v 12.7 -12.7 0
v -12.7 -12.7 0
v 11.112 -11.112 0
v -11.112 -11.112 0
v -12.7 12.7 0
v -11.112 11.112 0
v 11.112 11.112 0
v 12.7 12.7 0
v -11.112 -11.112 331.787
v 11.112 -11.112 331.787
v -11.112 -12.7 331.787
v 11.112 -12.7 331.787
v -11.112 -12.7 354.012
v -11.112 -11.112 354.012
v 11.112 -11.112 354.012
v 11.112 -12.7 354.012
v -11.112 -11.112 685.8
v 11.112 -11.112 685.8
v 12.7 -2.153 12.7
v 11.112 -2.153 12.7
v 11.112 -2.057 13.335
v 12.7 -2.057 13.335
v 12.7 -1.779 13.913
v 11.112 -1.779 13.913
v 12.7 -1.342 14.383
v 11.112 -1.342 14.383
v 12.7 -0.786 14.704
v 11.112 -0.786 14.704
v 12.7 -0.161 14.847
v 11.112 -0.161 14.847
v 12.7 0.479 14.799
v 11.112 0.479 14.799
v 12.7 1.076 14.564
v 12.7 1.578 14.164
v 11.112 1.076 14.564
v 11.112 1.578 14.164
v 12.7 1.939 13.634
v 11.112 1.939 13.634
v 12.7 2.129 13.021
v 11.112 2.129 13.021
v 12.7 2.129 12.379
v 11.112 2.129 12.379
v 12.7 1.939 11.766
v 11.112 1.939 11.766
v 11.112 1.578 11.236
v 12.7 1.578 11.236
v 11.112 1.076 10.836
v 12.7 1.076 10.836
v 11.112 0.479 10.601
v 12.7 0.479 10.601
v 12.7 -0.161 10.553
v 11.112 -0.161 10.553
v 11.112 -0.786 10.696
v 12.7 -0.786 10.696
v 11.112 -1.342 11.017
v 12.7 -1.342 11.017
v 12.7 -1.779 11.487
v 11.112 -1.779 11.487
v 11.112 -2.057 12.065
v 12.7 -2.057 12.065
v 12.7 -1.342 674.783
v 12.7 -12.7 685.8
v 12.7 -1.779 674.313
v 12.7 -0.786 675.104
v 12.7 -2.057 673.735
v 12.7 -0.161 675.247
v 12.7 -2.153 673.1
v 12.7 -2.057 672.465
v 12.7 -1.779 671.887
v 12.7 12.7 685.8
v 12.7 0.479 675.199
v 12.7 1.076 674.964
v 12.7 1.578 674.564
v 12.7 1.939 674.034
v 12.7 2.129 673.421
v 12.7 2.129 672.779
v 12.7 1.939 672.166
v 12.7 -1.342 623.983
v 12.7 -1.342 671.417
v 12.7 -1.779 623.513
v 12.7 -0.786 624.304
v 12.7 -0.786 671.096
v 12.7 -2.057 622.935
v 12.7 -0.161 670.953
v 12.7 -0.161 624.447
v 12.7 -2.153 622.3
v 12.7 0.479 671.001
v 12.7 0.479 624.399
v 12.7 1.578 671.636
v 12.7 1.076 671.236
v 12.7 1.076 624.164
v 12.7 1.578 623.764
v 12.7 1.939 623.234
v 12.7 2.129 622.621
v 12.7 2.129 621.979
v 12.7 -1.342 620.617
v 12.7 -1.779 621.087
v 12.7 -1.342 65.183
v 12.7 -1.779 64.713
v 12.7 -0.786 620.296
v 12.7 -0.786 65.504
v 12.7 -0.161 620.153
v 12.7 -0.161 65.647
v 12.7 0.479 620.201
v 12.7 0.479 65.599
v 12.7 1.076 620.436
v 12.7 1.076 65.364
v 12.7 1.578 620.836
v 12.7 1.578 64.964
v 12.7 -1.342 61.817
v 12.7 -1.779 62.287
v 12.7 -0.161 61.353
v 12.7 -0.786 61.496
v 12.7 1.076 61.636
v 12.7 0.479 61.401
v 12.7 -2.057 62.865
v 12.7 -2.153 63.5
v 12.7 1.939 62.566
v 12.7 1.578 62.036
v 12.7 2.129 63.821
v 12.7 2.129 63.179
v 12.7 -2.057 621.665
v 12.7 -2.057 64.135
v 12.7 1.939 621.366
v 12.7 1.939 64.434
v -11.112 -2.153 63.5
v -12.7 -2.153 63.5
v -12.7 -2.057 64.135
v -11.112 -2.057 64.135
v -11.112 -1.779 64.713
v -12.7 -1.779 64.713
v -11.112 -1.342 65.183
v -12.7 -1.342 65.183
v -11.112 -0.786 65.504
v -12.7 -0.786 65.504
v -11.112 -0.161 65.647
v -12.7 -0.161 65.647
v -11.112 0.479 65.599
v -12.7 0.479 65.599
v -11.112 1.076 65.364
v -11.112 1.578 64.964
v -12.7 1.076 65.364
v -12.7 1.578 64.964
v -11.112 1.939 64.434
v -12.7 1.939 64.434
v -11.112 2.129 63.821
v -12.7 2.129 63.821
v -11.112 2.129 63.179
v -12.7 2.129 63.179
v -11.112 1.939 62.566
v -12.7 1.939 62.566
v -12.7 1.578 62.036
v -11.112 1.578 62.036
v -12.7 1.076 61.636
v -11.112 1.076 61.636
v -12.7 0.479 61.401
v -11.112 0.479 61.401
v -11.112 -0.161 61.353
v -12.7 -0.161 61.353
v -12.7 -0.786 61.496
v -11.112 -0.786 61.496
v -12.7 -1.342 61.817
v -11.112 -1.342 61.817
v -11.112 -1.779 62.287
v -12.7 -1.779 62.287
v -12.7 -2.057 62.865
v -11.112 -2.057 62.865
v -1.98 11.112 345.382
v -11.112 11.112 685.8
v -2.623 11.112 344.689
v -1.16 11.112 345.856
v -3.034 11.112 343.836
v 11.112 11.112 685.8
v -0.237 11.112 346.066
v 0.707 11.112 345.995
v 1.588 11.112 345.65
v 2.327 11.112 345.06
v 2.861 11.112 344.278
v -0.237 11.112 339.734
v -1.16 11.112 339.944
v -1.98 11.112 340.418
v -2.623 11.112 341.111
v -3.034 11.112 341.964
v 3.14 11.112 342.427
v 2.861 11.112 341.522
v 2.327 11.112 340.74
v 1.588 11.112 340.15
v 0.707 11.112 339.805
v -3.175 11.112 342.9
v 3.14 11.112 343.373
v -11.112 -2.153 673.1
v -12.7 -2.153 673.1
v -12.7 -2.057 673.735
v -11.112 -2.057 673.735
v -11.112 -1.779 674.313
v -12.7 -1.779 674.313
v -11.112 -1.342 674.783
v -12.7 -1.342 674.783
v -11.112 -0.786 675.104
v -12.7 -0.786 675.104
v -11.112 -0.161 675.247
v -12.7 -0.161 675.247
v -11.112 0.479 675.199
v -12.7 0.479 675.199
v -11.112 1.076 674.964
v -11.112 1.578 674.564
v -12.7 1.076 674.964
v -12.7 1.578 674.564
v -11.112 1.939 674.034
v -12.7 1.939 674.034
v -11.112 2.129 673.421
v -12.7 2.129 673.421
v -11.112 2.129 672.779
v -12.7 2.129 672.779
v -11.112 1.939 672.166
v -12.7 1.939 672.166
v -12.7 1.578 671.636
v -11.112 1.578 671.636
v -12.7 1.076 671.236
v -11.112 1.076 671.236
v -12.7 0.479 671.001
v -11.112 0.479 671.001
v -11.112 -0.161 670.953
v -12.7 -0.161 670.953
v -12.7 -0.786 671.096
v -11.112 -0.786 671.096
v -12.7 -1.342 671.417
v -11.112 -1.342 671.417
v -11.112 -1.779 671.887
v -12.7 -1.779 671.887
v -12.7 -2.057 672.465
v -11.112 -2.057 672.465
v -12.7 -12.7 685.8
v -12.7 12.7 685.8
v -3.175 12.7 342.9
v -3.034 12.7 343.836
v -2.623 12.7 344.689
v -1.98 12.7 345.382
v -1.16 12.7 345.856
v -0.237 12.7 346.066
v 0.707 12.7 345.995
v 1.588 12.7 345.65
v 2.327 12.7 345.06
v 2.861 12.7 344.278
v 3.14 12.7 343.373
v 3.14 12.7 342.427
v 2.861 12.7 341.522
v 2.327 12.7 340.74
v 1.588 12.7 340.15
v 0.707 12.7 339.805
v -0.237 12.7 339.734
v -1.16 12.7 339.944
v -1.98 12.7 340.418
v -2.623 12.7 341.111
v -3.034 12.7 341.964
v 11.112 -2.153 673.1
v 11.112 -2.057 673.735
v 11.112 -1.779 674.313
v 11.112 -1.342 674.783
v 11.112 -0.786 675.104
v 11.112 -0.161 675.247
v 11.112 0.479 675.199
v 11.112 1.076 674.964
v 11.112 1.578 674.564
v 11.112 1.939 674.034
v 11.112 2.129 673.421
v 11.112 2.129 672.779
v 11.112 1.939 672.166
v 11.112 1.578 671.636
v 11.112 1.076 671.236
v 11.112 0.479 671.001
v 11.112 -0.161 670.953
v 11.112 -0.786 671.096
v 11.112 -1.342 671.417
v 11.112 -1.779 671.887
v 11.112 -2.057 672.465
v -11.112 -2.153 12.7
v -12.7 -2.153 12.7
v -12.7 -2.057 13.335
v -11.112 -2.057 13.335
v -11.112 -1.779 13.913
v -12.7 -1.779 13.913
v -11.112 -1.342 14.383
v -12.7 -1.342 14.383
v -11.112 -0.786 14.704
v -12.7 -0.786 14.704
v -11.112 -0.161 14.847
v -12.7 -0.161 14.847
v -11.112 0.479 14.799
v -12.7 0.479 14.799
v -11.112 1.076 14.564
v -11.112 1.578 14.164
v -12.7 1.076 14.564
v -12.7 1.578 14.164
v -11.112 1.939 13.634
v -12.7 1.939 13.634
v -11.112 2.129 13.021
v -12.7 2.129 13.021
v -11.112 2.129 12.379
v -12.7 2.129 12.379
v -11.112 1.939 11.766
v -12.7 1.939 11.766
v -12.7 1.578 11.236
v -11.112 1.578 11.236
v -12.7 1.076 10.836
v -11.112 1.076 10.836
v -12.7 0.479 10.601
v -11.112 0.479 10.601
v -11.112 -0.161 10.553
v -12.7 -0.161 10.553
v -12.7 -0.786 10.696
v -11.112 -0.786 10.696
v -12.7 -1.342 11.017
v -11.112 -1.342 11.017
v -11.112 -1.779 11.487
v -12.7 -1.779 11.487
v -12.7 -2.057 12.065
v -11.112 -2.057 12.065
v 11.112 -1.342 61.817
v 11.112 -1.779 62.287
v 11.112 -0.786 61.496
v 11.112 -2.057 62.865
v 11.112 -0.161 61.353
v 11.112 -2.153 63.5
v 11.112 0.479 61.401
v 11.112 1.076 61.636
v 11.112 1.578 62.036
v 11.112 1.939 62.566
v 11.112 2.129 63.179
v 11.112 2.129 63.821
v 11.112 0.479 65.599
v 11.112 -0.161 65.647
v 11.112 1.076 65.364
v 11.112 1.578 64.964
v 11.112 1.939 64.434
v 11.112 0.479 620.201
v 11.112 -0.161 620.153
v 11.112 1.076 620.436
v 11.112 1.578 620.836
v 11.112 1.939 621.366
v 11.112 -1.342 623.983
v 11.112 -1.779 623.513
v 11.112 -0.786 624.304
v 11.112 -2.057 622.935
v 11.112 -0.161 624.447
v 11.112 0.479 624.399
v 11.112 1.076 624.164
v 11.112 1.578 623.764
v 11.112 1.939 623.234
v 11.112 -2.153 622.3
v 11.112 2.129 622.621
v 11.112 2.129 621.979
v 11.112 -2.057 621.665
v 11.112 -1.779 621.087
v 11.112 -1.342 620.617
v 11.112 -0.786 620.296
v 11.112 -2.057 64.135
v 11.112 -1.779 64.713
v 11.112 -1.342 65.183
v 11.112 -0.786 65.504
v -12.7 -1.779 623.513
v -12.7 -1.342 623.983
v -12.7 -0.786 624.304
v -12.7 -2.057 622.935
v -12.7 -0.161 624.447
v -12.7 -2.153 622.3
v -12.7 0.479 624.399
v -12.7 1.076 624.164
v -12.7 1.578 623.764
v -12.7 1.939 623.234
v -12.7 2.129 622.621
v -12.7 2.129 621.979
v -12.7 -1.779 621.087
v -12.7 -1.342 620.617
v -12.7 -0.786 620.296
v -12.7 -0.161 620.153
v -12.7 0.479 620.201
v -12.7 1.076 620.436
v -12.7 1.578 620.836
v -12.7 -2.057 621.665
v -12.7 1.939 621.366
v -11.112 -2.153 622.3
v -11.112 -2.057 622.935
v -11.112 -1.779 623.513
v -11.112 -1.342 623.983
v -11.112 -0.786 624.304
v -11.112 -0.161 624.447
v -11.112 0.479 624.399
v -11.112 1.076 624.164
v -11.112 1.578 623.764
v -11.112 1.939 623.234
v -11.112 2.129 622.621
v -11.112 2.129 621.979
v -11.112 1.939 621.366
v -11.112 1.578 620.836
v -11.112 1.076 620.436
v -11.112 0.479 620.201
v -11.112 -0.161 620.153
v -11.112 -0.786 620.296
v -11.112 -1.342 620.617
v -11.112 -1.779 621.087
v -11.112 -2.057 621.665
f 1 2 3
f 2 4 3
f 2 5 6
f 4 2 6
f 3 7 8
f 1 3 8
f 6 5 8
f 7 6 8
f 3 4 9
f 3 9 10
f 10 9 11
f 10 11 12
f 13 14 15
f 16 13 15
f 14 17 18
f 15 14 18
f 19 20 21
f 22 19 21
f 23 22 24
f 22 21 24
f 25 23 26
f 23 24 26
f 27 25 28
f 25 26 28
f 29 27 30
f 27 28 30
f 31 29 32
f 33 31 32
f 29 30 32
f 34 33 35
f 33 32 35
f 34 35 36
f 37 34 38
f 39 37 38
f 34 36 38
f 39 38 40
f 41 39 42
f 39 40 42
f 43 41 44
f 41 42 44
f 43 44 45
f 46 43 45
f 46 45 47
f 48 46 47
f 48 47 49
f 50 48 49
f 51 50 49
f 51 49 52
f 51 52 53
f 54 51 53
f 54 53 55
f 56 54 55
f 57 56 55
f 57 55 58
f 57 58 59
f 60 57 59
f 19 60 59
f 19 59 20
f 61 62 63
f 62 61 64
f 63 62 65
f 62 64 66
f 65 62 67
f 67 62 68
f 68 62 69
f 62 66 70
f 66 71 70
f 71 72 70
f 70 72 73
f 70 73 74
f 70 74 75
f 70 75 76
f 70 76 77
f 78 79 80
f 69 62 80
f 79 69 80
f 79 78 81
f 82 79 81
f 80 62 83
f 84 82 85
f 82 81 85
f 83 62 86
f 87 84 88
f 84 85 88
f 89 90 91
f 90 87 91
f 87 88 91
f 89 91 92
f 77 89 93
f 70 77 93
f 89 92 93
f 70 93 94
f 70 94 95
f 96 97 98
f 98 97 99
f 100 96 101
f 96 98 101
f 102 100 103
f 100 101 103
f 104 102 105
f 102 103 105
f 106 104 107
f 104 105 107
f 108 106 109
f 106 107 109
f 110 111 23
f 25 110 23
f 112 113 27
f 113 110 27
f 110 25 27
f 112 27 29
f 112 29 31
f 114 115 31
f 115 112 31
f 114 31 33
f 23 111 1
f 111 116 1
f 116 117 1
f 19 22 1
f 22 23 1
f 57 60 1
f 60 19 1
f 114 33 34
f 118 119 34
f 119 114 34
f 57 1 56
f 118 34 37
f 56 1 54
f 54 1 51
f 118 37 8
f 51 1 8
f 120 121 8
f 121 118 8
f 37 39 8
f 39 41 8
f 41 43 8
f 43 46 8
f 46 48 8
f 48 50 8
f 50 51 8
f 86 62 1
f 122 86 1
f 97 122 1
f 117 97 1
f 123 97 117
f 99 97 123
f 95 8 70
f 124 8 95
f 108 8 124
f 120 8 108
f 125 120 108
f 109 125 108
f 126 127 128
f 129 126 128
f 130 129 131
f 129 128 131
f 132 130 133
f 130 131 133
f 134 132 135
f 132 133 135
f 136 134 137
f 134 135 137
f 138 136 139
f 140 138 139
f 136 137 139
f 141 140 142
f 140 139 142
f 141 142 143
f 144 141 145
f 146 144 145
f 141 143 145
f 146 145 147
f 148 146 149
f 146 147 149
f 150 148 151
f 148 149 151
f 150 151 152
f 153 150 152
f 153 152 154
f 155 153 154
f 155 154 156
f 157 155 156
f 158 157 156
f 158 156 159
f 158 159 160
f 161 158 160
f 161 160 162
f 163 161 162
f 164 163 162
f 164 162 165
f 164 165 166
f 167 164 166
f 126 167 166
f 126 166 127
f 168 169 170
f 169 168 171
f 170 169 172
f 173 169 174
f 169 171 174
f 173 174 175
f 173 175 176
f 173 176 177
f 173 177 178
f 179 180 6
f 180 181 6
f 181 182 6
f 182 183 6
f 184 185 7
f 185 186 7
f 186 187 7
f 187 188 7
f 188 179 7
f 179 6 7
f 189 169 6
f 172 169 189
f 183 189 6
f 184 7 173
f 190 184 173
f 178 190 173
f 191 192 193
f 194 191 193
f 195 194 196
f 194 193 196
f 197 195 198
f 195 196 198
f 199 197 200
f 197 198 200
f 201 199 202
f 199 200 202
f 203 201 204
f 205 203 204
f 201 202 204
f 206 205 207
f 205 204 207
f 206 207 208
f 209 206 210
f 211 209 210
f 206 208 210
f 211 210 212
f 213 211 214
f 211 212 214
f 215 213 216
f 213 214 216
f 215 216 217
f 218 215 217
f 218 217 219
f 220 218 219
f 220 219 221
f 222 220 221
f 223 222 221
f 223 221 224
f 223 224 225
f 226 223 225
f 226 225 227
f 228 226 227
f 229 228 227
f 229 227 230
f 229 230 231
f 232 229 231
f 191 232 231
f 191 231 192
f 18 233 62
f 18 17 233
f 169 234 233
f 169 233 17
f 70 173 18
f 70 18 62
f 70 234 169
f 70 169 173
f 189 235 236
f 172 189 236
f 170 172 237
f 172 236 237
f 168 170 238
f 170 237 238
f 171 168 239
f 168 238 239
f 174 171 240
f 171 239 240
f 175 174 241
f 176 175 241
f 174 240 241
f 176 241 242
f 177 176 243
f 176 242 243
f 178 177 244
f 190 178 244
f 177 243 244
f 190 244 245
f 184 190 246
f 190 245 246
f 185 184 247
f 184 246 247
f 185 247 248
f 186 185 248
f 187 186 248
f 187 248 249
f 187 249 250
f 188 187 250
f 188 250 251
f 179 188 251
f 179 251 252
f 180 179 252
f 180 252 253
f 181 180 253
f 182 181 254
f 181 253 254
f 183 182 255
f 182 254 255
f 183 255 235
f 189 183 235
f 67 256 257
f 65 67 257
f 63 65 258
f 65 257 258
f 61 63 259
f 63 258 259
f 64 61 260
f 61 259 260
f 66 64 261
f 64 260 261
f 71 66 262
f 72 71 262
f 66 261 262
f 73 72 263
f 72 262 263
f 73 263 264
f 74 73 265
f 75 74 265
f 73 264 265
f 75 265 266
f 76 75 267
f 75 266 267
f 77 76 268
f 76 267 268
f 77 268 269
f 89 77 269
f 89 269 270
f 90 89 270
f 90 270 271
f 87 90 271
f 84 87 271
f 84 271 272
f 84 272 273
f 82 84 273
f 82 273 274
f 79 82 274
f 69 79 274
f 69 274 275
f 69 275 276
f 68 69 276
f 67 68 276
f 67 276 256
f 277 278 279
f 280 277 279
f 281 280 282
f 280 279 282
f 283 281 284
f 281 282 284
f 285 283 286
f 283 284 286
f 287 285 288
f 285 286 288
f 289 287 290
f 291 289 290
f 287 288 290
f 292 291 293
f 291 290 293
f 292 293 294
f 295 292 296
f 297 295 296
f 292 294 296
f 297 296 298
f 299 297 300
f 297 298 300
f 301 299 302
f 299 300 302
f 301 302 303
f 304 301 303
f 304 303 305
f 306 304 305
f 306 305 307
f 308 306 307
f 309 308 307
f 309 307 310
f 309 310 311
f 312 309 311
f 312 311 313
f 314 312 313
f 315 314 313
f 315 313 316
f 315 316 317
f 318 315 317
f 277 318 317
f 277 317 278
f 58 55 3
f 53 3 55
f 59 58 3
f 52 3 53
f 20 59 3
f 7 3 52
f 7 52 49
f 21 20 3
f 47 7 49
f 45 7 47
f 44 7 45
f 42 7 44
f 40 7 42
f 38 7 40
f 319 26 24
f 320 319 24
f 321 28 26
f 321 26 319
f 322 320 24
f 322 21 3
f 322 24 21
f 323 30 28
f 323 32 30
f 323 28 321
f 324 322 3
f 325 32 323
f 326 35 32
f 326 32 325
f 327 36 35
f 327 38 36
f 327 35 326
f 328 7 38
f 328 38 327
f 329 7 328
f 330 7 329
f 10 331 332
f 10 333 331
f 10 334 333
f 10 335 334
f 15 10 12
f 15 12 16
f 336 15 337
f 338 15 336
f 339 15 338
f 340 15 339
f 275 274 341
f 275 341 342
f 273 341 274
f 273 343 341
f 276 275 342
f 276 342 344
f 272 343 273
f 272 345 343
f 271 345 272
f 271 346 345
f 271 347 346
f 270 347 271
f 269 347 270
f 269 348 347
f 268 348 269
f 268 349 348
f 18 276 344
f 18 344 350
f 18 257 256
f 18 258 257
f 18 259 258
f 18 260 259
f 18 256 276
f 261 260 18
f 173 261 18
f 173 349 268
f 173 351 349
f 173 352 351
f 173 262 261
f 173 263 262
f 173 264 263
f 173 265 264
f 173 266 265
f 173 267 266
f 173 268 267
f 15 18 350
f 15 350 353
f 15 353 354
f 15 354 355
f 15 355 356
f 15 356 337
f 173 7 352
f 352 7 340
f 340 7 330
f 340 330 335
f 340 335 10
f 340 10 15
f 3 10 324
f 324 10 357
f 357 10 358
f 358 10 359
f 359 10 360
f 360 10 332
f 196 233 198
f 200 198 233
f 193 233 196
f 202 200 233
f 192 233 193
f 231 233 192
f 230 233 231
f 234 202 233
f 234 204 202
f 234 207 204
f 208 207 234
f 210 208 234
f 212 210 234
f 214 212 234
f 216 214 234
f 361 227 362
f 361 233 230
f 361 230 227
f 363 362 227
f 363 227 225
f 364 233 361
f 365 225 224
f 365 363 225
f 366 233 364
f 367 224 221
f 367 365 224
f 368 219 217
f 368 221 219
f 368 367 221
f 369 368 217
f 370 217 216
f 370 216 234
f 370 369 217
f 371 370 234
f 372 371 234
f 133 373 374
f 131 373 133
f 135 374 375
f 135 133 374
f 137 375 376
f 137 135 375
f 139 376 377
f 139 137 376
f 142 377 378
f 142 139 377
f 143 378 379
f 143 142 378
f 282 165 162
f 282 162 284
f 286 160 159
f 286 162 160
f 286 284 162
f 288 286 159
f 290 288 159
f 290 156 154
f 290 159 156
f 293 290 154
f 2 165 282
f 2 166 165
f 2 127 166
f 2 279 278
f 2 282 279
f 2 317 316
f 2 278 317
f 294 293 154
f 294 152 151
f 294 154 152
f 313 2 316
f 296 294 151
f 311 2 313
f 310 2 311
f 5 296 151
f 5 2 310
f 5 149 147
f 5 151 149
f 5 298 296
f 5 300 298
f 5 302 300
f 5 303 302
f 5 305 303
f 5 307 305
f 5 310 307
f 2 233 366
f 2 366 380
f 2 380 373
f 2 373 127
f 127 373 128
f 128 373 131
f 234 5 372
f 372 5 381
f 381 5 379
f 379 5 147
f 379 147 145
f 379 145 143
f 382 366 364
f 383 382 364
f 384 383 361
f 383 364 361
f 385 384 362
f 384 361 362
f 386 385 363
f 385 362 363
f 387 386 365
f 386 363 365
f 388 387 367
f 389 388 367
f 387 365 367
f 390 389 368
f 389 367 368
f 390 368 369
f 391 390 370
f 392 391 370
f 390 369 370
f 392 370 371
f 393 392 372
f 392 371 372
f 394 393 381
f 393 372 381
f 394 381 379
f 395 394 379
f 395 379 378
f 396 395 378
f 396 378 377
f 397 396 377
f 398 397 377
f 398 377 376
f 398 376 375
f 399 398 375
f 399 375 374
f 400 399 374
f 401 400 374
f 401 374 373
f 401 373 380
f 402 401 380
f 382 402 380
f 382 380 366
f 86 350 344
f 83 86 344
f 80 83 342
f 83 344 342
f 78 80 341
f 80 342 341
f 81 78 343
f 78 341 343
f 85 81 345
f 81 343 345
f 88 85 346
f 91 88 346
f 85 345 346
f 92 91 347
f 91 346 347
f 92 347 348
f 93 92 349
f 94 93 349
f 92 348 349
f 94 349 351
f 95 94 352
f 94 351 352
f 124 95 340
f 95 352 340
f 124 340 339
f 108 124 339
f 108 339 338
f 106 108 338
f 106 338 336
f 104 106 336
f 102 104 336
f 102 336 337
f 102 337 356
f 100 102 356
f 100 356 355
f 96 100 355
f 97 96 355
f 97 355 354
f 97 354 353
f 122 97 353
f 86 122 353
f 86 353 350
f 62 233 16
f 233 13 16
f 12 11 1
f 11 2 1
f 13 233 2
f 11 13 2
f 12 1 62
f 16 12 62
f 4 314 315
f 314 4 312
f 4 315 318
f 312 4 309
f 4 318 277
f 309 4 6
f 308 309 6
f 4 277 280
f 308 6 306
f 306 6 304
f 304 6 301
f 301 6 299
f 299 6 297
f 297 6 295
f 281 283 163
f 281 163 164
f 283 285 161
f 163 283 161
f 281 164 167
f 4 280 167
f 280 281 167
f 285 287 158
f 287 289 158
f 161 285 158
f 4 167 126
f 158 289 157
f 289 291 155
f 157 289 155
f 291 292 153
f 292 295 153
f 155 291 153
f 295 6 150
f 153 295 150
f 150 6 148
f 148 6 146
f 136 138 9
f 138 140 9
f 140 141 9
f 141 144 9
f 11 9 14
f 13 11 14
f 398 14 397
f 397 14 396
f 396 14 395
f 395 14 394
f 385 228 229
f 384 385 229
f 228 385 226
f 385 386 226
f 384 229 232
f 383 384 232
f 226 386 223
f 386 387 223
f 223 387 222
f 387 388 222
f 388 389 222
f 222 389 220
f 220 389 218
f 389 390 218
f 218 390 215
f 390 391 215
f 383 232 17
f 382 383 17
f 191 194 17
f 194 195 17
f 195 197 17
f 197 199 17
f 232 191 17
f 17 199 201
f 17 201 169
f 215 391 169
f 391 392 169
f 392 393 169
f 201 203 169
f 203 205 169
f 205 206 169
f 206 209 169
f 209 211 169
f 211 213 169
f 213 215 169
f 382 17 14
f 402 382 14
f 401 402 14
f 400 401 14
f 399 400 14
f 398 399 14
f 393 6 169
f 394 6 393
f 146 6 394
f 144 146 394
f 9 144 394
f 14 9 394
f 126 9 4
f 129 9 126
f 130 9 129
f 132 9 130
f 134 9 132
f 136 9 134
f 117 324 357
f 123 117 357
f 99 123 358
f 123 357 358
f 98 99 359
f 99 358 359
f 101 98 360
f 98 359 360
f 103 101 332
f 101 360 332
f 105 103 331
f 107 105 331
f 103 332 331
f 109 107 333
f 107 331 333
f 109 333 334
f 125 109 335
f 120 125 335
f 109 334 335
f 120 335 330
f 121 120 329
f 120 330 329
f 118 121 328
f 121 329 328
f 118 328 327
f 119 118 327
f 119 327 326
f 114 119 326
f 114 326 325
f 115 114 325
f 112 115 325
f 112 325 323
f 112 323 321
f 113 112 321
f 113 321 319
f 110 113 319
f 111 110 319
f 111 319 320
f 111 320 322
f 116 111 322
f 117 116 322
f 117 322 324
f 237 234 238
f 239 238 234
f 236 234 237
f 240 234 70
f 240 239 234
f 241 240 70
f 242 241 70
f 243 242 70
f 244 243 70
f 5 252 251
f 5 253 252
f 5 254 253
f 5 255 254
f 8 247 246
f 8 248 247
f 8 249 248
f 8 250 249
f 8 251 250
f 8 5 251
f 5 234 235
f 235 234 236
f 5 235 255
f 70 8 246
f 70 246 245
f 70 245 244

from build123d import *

# Parameters (mm, degrees)
F0_W     = 25.4
F0_H     = 25.4
F0_W_2   = 22.225
F0_H_2   = 22.225
F1_DEPTH = 685.8
F2_W     = 22.225
F2_H     = 22.225
F3_DEPTH = 12.7
F4_R     = 3.175
F5_DEPTH = 1.5875
F6_R     = 2.15265
F7_DEPTH = 25.4


with BuildPart() as f1:
    # F0 (on Top) → F1 (new body)
    with BuildSketch(Plane.XY):
        Rectangle(F0_W, F0_H)
        Rectangle(F0_W_2, F0_H_2, mode=Mode.SUBTRACT)
    extrude(amount=F1_DEPTH)

    # F2 (on Front) → F3 (cut, through all)
    with BuildSketch(Plane.XZ):
        with Locations((0, 342.9)):
            Rectangle(F2_W, F2_H)
    extrude(amount=F3_DEPTH, mode=Mode.SUBTRACT)

    # F4 (on face) → F5 (cut, through all)
    with BuildSketch(Plane(origin=(0, 12.7, 0), x_dir=(-1, 0, 0), z_dir=(0, 1, 0))):
        with Locations((0, 342.9)):
            Circle(F4_R)
    extrude(amount=-F5_DEPTH, mode=Mode.SUBTRACT)

    # F6 (on face) → F7 (cut, through all)
    with BuildSketch(Plane(origin=(-12.7, 0, 0), x_dir=(0, -1, 0), z_dir=(-1, 0, 0))):
        with Locations((0, 12.7)):
            Circle(F6_R)
        with Locations((0, 63.5)):
            Circle(F6_R)
        with Locations((0, 673.1)):
            Circle(F6_R)
        with Locations((0, 622.3)):
            Circle(F6_R)
    extrude(amount=-F7_DEPTH, mode=Mode.SUBTRACT)


solid = f1.part
